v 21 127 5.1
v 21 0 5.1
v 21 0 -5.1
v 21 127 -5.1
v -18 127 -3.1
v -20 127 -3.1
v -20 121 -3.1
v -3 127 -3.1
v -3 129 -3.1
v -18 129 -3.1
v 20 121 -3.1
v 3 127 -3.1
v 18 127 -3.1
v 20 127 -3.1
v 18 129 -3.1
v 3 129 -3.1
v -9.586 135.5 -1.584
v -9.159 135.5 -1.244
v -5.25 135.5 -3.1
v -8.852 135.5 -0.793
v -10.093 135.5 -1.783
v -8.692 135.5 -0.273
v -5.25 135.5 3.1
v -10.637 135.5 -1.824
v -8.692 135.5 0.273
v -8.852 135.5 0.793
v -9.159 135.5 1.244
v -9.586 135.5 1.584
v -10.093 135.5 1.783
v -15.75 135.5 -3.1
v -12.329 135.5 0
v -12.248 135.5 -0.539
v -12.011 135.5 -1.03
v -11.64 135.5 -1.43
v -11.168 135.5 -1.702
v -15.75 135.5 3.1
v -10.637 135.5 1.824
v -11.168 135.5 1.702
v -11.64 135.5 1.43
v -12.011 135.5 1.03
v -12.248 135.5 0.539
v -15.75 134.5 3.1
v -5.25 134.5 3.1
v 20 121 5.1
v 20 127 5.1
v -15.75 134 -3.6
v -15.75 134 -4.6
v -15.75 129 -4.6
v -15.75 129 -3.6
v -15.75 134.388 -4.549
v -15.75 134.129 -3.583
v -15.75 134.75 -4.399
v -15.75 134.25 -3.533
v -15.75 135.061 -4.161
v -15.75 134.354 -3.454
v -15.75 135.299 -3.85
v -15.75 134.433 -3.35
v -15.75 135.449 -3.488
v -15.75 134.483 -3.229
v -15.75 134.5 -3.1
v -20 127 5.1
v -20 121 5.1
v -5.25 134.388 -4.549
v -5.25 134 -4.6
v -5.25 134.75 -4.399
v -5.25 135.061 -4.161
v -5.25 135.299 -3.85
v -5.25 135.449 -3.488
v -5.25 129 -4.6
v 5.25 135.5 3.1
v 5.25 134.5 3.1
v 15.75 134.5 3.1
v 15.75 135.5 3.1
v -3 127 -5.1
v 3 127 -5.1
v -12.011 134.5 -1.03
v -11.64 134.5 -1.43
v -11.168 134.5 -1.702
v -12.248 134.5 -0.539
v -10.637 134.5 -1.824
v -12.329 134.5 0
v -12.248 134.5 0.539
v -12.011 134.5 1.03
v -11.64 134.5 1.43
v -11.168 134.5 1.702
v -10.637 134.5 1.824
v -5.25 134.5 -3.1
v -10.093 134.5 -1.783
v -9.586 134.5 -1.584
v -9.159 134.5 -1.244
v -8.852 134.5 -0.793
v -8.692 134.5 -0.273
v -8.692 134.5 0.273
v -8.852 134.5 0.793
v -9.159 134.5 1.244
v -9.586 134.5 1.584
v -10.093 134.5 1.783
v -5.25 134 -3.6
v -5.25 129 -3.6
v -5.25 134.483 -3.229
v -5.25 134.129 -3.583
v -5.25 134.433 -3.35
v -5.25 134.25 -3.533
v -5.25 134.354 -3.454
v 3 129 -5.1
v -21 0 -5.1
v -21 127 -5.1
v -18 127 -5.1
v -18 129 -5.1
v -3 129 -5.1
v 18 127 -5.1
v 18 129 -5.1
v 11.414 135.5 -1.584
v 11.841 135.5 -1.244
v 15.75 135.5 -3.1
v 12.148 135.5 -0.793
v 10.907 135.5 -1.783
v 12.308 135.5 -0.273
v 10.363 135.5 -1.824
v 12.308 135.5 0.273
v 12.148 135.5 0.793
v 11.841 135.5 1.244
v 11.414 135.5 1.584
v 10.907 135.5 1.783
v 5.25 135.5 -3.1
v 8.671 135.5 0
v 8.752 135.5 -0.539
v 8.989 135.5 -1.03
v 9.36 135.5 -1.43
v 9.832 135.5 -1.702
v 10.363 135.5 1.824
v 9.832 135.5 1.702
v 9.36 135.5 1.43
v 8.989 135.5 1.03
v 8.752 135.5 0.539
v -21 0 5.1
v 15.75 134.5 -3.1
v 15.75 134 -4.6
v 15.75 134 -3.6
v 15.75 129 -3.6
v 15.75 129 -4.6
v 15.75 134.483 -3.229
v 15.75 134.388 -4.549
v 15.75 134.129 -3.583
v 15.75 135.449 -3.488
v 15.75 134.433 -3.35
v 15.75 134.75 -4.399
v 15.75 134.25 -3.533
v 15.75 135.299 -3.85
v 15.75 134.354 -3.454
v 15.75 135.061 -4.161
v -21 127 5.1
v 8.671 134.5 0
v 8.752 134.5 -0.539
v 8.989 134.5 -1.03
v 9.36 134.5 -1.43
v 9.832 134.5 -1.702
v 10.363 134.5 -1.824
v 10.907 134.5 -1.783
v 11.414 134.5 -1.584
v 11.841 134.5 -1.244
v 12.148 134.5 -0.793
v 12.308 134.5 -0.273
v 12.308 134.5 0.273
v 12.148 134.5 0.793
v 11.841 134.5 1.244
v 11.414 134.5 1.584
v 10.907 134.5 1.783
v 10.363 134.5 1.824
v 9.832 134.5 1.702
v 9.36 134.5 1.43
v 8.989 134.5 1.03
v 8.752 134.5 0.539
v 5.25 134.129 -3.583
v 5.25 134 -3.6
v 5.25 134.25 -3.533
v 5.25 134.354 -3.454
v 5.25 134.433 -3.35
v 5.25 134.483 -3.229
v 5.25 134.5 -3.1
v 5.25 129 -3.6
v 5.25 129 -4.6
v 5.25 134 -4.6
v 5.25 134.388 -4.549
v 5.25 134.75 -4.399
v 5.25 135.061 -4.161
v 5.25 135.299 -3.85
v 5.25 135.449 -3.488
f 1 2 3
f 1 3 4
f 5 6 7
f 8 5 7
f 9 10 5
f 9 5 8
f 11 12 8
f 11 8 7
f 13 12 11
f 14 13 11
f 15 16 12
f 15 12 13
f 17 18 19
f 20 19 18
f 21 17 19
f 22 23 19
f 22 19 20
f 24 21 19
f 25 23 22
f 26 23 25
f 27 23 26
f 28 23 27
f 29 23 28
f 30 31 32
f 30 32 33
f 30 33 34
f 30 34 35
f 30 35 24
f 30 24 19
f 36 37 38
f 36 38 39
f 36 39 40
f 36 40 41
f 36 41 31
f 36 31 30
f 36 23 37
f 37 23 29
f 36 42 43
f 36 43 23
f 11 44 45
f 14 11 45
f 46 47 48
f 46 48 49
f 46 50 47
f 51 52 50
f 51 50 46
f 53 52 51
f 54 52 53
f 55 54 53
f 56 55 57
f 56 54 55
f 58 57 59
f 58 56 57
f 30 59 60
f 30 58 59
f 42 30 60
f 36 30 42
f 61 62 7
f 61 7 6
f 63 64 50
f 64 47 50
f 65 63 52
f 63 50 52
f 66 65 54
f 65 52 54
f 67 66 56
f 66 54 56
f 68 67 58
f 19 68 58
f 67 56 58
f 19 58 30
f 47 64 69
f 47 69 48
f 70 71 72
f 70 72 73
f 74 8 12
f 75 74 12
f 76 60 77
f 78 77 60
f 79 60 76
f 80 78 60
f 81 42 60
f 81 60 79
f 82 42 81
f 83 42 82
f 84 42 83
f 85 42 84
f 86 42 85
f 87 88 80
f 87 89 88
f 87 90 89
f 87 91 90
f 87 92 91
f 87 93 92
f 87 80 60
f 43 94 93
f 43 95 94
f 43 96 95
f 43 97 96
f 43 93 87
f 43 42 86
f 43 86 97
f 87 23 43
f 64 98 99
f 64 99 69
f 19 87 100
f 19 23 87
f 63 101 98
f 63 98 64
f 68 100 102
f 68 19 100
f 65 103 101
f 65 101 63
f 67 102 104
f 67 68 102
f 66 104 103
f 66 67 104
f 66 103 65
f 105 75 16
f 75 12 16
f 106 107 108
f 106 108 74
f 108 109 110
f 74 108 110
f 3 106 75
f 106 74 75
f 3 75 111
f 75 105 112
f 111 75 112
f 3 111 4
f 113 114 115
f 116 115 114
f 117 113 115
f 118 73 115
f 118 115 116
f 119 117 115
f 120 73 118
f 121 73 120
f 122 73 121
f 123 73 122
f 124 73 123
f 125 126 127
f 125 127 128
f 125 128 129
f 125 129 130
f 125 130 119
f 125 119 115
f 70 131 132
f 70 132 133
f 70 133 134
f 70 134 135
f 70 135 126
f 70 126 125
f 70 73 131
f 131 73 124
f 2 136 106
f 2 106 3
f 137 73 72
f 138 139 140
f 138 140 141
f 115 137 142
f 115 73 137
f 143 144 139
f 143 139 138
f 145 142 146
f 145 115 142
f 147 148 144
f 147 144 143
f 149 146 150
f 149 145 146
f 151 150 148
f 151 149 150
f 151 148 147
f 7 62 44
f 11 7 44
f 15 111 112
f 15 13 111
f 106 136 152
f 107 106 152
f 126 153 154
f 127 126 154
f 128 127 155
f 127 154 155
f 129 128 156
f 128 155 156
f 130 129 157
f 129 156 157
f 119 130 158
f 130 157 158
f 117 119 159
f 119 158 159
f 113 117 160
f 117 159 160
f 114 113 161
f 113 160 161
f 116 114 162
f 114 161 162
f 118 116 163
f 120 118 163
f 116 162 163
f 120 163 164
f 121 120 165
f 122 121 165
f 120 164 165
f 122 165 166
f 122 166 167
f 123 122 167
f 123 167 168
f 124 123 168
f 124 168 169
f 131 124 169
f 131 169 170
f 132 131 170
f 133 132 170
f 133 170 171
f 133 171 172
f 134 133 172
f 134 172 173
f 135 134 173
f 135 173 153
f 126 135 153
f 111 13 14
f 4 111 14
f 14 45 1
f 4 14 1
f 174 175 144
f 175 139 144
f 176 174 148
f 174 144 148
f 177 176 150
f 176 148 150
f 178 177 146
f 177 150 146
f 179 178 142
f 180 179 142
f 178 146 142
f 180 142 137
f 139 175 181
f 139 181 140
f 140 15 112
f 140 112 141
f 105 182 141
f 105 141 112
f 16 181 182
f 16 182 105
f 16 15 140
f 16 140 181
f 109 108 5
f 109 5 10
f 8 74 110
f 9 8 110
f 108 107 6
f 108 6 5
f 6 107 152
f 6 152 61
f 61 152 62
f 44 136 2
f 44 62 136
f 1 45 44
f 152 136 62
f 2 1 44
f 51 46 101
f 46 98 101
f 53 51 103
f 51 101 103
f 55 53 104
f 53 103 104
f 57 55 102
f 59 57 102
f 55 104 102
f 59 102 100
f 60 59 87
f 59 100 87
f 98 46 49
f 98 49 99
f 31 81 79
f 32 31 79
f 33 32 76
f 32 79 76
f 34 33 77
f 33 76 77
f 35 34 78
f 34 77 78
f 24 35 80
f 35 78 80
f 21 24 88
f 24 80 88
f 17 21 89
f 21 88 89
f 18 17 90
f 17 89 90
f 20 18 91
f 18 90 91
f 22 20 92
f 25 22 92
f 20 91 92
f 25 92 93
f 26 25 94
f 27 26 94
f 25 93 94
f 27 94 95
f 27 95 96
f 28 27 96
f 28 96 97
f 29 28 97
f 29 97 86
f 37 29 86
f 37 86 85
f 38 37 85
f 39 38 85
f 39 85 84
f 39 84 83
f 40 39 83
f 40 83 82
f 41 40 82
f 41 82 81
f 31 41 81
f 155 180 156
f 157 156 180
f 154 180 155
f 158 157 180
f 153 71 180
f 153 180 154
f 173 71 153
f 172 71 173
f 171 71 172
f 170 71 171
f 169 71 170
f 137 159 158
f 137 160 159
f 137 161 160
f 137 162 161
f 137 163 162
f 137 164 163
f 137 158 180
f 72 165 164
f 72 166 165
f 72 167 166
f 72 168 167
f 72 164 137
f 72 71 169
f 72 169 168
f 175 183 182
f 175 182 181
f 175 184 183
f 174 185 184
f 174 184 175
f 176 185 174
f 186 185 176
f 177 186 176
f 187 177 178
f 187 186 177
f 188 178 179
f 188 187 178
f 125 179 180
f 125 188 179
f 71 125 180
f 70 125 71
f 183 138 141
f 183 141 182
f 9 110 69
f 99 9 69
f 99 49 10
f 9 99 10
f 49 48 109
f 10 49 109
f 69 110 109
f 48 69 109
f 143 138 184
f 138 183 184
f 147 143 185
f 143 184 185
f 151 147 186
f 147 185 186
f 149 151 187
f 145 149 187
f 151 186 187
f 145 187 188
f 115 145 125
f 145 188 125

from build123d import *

# Parameters (mm, degrees)
SKETCH1_W                 = 42
SKETCH1_H                 = 127
BOSS_EXTRUDE1_DEPTH       = 5.1
SKETCH2_W                 = 40
SKETCH2_H                 = 6
CUT_EXTRUDE1_DEPTH        = 8.2
SKETCH3_W                 = 15
SKETCH3_H                 = 2
BOSS_EXTRUDE2_DEPTH       = 1
TAB_PROFILE_W             = 10.5
TAB_PROFILE_H             = 1
F_6_CLEARANCE_HOLE1_D     = 3.6576
F_6_CLEARANCE_HOLE1_DEPTH = 1
F_6_CLEARANCE_HOLE2_D     = 3.6576
F_6_CLEARANCE_HOLE2_DEPTH = 1


with BuildPart() as part:
    # Sketch1 → Boss-Extrude1 (new, symmetric)
    with BuildSketch(Plane.XY):
        with Locations((0, 63.5)):
            Rectangle(SKETCH1_W, SKETCH1_H)
    extrude(amount=BOSS_EXTRUDE1_DEPTH, both=True)

    # Sketch2 → Cut-Extrude1 (cut)
    with BuildSketch(Plane.XY.offset(5.1)):
        with Locations((0, 124)):
            Rectangle(SKETCH2_W, SKETCH2_H)
    extrude(amount=-CUT_EXTRUDE1_DEPTH, mode=Mode.SUBTRACT)

    # Sketch3 → Boss-Extrude2 (add, symmetric)
    with BuildSketch(Plane(origin=(0, 0, -4.1), x_dir=(-1, 0, 0), z_dir=(0, 0, -1))):
        with Locations((-10.5, 128)):
            Rectangle(SKETCH3_W, SKETCH3_H)
        with Locations((10.5, 128)):
            Rectangle(SKETCH3_W, SKETCH3_H)
    extrude(amount=BOSS_EXTRUDE2_DEPTH, both=True)

    # Tabs: sweep along a path in Tab Bend
    with BuildLine(Plane(origin=(0, 0, 0), x_dir=(0, 0, -1), z_dir=(1, 0, 0))) as tabs_path:
        Line((4.1, 129), (4.1, 134))
        ThreePointArc((4.1, 134), (3.807106781, 134.707106781), (3.1, 135))
        Line((3.1, 135), (-3.1, 135))
    # Tab Profile → Tabs (sweep)
    with BuildSketch(Plane(origin=(0, 129, 0), x_dir=(1, 0, 0), z_dir=(0, 1, 0))):
        with Locations((-10.5, 4.1)):
            Rectangle(TAB_PROFILE_W, TAB_PROFILE_H)
        with Locations((10.5, 4.1)):
            Rectangle(TAB_PROFILE_W, TAB_PROFILE_H)
    sweep(path=tabs_path.line)

    # #6 Clearance Hole1
    with Locations(Plane(origin=(0, 135.5, 0), x_dir=(1, 0, 0), z_dir=(0, 1, 0))):
        with Locations((-10.5, 0)):
            Hole(F_6_CLEARANCE_HOLE1_D / 2, depth=F_6_CLEARANCE_HOLE1_DEPTH)

    # #6 Clearance Hole2
    with Locations(Plane(origin=(0, 135.5, 0), x_dir=(1, 0, 0), z_dir=(0, 1, 0))):
        with Locations((10.5, 0)):
            Hole(F_6_CLEARANCE_HOLE2_D / 2, depth=F_6_CLEARANCE_HOLE2_DEPTH)


solid = part.part
